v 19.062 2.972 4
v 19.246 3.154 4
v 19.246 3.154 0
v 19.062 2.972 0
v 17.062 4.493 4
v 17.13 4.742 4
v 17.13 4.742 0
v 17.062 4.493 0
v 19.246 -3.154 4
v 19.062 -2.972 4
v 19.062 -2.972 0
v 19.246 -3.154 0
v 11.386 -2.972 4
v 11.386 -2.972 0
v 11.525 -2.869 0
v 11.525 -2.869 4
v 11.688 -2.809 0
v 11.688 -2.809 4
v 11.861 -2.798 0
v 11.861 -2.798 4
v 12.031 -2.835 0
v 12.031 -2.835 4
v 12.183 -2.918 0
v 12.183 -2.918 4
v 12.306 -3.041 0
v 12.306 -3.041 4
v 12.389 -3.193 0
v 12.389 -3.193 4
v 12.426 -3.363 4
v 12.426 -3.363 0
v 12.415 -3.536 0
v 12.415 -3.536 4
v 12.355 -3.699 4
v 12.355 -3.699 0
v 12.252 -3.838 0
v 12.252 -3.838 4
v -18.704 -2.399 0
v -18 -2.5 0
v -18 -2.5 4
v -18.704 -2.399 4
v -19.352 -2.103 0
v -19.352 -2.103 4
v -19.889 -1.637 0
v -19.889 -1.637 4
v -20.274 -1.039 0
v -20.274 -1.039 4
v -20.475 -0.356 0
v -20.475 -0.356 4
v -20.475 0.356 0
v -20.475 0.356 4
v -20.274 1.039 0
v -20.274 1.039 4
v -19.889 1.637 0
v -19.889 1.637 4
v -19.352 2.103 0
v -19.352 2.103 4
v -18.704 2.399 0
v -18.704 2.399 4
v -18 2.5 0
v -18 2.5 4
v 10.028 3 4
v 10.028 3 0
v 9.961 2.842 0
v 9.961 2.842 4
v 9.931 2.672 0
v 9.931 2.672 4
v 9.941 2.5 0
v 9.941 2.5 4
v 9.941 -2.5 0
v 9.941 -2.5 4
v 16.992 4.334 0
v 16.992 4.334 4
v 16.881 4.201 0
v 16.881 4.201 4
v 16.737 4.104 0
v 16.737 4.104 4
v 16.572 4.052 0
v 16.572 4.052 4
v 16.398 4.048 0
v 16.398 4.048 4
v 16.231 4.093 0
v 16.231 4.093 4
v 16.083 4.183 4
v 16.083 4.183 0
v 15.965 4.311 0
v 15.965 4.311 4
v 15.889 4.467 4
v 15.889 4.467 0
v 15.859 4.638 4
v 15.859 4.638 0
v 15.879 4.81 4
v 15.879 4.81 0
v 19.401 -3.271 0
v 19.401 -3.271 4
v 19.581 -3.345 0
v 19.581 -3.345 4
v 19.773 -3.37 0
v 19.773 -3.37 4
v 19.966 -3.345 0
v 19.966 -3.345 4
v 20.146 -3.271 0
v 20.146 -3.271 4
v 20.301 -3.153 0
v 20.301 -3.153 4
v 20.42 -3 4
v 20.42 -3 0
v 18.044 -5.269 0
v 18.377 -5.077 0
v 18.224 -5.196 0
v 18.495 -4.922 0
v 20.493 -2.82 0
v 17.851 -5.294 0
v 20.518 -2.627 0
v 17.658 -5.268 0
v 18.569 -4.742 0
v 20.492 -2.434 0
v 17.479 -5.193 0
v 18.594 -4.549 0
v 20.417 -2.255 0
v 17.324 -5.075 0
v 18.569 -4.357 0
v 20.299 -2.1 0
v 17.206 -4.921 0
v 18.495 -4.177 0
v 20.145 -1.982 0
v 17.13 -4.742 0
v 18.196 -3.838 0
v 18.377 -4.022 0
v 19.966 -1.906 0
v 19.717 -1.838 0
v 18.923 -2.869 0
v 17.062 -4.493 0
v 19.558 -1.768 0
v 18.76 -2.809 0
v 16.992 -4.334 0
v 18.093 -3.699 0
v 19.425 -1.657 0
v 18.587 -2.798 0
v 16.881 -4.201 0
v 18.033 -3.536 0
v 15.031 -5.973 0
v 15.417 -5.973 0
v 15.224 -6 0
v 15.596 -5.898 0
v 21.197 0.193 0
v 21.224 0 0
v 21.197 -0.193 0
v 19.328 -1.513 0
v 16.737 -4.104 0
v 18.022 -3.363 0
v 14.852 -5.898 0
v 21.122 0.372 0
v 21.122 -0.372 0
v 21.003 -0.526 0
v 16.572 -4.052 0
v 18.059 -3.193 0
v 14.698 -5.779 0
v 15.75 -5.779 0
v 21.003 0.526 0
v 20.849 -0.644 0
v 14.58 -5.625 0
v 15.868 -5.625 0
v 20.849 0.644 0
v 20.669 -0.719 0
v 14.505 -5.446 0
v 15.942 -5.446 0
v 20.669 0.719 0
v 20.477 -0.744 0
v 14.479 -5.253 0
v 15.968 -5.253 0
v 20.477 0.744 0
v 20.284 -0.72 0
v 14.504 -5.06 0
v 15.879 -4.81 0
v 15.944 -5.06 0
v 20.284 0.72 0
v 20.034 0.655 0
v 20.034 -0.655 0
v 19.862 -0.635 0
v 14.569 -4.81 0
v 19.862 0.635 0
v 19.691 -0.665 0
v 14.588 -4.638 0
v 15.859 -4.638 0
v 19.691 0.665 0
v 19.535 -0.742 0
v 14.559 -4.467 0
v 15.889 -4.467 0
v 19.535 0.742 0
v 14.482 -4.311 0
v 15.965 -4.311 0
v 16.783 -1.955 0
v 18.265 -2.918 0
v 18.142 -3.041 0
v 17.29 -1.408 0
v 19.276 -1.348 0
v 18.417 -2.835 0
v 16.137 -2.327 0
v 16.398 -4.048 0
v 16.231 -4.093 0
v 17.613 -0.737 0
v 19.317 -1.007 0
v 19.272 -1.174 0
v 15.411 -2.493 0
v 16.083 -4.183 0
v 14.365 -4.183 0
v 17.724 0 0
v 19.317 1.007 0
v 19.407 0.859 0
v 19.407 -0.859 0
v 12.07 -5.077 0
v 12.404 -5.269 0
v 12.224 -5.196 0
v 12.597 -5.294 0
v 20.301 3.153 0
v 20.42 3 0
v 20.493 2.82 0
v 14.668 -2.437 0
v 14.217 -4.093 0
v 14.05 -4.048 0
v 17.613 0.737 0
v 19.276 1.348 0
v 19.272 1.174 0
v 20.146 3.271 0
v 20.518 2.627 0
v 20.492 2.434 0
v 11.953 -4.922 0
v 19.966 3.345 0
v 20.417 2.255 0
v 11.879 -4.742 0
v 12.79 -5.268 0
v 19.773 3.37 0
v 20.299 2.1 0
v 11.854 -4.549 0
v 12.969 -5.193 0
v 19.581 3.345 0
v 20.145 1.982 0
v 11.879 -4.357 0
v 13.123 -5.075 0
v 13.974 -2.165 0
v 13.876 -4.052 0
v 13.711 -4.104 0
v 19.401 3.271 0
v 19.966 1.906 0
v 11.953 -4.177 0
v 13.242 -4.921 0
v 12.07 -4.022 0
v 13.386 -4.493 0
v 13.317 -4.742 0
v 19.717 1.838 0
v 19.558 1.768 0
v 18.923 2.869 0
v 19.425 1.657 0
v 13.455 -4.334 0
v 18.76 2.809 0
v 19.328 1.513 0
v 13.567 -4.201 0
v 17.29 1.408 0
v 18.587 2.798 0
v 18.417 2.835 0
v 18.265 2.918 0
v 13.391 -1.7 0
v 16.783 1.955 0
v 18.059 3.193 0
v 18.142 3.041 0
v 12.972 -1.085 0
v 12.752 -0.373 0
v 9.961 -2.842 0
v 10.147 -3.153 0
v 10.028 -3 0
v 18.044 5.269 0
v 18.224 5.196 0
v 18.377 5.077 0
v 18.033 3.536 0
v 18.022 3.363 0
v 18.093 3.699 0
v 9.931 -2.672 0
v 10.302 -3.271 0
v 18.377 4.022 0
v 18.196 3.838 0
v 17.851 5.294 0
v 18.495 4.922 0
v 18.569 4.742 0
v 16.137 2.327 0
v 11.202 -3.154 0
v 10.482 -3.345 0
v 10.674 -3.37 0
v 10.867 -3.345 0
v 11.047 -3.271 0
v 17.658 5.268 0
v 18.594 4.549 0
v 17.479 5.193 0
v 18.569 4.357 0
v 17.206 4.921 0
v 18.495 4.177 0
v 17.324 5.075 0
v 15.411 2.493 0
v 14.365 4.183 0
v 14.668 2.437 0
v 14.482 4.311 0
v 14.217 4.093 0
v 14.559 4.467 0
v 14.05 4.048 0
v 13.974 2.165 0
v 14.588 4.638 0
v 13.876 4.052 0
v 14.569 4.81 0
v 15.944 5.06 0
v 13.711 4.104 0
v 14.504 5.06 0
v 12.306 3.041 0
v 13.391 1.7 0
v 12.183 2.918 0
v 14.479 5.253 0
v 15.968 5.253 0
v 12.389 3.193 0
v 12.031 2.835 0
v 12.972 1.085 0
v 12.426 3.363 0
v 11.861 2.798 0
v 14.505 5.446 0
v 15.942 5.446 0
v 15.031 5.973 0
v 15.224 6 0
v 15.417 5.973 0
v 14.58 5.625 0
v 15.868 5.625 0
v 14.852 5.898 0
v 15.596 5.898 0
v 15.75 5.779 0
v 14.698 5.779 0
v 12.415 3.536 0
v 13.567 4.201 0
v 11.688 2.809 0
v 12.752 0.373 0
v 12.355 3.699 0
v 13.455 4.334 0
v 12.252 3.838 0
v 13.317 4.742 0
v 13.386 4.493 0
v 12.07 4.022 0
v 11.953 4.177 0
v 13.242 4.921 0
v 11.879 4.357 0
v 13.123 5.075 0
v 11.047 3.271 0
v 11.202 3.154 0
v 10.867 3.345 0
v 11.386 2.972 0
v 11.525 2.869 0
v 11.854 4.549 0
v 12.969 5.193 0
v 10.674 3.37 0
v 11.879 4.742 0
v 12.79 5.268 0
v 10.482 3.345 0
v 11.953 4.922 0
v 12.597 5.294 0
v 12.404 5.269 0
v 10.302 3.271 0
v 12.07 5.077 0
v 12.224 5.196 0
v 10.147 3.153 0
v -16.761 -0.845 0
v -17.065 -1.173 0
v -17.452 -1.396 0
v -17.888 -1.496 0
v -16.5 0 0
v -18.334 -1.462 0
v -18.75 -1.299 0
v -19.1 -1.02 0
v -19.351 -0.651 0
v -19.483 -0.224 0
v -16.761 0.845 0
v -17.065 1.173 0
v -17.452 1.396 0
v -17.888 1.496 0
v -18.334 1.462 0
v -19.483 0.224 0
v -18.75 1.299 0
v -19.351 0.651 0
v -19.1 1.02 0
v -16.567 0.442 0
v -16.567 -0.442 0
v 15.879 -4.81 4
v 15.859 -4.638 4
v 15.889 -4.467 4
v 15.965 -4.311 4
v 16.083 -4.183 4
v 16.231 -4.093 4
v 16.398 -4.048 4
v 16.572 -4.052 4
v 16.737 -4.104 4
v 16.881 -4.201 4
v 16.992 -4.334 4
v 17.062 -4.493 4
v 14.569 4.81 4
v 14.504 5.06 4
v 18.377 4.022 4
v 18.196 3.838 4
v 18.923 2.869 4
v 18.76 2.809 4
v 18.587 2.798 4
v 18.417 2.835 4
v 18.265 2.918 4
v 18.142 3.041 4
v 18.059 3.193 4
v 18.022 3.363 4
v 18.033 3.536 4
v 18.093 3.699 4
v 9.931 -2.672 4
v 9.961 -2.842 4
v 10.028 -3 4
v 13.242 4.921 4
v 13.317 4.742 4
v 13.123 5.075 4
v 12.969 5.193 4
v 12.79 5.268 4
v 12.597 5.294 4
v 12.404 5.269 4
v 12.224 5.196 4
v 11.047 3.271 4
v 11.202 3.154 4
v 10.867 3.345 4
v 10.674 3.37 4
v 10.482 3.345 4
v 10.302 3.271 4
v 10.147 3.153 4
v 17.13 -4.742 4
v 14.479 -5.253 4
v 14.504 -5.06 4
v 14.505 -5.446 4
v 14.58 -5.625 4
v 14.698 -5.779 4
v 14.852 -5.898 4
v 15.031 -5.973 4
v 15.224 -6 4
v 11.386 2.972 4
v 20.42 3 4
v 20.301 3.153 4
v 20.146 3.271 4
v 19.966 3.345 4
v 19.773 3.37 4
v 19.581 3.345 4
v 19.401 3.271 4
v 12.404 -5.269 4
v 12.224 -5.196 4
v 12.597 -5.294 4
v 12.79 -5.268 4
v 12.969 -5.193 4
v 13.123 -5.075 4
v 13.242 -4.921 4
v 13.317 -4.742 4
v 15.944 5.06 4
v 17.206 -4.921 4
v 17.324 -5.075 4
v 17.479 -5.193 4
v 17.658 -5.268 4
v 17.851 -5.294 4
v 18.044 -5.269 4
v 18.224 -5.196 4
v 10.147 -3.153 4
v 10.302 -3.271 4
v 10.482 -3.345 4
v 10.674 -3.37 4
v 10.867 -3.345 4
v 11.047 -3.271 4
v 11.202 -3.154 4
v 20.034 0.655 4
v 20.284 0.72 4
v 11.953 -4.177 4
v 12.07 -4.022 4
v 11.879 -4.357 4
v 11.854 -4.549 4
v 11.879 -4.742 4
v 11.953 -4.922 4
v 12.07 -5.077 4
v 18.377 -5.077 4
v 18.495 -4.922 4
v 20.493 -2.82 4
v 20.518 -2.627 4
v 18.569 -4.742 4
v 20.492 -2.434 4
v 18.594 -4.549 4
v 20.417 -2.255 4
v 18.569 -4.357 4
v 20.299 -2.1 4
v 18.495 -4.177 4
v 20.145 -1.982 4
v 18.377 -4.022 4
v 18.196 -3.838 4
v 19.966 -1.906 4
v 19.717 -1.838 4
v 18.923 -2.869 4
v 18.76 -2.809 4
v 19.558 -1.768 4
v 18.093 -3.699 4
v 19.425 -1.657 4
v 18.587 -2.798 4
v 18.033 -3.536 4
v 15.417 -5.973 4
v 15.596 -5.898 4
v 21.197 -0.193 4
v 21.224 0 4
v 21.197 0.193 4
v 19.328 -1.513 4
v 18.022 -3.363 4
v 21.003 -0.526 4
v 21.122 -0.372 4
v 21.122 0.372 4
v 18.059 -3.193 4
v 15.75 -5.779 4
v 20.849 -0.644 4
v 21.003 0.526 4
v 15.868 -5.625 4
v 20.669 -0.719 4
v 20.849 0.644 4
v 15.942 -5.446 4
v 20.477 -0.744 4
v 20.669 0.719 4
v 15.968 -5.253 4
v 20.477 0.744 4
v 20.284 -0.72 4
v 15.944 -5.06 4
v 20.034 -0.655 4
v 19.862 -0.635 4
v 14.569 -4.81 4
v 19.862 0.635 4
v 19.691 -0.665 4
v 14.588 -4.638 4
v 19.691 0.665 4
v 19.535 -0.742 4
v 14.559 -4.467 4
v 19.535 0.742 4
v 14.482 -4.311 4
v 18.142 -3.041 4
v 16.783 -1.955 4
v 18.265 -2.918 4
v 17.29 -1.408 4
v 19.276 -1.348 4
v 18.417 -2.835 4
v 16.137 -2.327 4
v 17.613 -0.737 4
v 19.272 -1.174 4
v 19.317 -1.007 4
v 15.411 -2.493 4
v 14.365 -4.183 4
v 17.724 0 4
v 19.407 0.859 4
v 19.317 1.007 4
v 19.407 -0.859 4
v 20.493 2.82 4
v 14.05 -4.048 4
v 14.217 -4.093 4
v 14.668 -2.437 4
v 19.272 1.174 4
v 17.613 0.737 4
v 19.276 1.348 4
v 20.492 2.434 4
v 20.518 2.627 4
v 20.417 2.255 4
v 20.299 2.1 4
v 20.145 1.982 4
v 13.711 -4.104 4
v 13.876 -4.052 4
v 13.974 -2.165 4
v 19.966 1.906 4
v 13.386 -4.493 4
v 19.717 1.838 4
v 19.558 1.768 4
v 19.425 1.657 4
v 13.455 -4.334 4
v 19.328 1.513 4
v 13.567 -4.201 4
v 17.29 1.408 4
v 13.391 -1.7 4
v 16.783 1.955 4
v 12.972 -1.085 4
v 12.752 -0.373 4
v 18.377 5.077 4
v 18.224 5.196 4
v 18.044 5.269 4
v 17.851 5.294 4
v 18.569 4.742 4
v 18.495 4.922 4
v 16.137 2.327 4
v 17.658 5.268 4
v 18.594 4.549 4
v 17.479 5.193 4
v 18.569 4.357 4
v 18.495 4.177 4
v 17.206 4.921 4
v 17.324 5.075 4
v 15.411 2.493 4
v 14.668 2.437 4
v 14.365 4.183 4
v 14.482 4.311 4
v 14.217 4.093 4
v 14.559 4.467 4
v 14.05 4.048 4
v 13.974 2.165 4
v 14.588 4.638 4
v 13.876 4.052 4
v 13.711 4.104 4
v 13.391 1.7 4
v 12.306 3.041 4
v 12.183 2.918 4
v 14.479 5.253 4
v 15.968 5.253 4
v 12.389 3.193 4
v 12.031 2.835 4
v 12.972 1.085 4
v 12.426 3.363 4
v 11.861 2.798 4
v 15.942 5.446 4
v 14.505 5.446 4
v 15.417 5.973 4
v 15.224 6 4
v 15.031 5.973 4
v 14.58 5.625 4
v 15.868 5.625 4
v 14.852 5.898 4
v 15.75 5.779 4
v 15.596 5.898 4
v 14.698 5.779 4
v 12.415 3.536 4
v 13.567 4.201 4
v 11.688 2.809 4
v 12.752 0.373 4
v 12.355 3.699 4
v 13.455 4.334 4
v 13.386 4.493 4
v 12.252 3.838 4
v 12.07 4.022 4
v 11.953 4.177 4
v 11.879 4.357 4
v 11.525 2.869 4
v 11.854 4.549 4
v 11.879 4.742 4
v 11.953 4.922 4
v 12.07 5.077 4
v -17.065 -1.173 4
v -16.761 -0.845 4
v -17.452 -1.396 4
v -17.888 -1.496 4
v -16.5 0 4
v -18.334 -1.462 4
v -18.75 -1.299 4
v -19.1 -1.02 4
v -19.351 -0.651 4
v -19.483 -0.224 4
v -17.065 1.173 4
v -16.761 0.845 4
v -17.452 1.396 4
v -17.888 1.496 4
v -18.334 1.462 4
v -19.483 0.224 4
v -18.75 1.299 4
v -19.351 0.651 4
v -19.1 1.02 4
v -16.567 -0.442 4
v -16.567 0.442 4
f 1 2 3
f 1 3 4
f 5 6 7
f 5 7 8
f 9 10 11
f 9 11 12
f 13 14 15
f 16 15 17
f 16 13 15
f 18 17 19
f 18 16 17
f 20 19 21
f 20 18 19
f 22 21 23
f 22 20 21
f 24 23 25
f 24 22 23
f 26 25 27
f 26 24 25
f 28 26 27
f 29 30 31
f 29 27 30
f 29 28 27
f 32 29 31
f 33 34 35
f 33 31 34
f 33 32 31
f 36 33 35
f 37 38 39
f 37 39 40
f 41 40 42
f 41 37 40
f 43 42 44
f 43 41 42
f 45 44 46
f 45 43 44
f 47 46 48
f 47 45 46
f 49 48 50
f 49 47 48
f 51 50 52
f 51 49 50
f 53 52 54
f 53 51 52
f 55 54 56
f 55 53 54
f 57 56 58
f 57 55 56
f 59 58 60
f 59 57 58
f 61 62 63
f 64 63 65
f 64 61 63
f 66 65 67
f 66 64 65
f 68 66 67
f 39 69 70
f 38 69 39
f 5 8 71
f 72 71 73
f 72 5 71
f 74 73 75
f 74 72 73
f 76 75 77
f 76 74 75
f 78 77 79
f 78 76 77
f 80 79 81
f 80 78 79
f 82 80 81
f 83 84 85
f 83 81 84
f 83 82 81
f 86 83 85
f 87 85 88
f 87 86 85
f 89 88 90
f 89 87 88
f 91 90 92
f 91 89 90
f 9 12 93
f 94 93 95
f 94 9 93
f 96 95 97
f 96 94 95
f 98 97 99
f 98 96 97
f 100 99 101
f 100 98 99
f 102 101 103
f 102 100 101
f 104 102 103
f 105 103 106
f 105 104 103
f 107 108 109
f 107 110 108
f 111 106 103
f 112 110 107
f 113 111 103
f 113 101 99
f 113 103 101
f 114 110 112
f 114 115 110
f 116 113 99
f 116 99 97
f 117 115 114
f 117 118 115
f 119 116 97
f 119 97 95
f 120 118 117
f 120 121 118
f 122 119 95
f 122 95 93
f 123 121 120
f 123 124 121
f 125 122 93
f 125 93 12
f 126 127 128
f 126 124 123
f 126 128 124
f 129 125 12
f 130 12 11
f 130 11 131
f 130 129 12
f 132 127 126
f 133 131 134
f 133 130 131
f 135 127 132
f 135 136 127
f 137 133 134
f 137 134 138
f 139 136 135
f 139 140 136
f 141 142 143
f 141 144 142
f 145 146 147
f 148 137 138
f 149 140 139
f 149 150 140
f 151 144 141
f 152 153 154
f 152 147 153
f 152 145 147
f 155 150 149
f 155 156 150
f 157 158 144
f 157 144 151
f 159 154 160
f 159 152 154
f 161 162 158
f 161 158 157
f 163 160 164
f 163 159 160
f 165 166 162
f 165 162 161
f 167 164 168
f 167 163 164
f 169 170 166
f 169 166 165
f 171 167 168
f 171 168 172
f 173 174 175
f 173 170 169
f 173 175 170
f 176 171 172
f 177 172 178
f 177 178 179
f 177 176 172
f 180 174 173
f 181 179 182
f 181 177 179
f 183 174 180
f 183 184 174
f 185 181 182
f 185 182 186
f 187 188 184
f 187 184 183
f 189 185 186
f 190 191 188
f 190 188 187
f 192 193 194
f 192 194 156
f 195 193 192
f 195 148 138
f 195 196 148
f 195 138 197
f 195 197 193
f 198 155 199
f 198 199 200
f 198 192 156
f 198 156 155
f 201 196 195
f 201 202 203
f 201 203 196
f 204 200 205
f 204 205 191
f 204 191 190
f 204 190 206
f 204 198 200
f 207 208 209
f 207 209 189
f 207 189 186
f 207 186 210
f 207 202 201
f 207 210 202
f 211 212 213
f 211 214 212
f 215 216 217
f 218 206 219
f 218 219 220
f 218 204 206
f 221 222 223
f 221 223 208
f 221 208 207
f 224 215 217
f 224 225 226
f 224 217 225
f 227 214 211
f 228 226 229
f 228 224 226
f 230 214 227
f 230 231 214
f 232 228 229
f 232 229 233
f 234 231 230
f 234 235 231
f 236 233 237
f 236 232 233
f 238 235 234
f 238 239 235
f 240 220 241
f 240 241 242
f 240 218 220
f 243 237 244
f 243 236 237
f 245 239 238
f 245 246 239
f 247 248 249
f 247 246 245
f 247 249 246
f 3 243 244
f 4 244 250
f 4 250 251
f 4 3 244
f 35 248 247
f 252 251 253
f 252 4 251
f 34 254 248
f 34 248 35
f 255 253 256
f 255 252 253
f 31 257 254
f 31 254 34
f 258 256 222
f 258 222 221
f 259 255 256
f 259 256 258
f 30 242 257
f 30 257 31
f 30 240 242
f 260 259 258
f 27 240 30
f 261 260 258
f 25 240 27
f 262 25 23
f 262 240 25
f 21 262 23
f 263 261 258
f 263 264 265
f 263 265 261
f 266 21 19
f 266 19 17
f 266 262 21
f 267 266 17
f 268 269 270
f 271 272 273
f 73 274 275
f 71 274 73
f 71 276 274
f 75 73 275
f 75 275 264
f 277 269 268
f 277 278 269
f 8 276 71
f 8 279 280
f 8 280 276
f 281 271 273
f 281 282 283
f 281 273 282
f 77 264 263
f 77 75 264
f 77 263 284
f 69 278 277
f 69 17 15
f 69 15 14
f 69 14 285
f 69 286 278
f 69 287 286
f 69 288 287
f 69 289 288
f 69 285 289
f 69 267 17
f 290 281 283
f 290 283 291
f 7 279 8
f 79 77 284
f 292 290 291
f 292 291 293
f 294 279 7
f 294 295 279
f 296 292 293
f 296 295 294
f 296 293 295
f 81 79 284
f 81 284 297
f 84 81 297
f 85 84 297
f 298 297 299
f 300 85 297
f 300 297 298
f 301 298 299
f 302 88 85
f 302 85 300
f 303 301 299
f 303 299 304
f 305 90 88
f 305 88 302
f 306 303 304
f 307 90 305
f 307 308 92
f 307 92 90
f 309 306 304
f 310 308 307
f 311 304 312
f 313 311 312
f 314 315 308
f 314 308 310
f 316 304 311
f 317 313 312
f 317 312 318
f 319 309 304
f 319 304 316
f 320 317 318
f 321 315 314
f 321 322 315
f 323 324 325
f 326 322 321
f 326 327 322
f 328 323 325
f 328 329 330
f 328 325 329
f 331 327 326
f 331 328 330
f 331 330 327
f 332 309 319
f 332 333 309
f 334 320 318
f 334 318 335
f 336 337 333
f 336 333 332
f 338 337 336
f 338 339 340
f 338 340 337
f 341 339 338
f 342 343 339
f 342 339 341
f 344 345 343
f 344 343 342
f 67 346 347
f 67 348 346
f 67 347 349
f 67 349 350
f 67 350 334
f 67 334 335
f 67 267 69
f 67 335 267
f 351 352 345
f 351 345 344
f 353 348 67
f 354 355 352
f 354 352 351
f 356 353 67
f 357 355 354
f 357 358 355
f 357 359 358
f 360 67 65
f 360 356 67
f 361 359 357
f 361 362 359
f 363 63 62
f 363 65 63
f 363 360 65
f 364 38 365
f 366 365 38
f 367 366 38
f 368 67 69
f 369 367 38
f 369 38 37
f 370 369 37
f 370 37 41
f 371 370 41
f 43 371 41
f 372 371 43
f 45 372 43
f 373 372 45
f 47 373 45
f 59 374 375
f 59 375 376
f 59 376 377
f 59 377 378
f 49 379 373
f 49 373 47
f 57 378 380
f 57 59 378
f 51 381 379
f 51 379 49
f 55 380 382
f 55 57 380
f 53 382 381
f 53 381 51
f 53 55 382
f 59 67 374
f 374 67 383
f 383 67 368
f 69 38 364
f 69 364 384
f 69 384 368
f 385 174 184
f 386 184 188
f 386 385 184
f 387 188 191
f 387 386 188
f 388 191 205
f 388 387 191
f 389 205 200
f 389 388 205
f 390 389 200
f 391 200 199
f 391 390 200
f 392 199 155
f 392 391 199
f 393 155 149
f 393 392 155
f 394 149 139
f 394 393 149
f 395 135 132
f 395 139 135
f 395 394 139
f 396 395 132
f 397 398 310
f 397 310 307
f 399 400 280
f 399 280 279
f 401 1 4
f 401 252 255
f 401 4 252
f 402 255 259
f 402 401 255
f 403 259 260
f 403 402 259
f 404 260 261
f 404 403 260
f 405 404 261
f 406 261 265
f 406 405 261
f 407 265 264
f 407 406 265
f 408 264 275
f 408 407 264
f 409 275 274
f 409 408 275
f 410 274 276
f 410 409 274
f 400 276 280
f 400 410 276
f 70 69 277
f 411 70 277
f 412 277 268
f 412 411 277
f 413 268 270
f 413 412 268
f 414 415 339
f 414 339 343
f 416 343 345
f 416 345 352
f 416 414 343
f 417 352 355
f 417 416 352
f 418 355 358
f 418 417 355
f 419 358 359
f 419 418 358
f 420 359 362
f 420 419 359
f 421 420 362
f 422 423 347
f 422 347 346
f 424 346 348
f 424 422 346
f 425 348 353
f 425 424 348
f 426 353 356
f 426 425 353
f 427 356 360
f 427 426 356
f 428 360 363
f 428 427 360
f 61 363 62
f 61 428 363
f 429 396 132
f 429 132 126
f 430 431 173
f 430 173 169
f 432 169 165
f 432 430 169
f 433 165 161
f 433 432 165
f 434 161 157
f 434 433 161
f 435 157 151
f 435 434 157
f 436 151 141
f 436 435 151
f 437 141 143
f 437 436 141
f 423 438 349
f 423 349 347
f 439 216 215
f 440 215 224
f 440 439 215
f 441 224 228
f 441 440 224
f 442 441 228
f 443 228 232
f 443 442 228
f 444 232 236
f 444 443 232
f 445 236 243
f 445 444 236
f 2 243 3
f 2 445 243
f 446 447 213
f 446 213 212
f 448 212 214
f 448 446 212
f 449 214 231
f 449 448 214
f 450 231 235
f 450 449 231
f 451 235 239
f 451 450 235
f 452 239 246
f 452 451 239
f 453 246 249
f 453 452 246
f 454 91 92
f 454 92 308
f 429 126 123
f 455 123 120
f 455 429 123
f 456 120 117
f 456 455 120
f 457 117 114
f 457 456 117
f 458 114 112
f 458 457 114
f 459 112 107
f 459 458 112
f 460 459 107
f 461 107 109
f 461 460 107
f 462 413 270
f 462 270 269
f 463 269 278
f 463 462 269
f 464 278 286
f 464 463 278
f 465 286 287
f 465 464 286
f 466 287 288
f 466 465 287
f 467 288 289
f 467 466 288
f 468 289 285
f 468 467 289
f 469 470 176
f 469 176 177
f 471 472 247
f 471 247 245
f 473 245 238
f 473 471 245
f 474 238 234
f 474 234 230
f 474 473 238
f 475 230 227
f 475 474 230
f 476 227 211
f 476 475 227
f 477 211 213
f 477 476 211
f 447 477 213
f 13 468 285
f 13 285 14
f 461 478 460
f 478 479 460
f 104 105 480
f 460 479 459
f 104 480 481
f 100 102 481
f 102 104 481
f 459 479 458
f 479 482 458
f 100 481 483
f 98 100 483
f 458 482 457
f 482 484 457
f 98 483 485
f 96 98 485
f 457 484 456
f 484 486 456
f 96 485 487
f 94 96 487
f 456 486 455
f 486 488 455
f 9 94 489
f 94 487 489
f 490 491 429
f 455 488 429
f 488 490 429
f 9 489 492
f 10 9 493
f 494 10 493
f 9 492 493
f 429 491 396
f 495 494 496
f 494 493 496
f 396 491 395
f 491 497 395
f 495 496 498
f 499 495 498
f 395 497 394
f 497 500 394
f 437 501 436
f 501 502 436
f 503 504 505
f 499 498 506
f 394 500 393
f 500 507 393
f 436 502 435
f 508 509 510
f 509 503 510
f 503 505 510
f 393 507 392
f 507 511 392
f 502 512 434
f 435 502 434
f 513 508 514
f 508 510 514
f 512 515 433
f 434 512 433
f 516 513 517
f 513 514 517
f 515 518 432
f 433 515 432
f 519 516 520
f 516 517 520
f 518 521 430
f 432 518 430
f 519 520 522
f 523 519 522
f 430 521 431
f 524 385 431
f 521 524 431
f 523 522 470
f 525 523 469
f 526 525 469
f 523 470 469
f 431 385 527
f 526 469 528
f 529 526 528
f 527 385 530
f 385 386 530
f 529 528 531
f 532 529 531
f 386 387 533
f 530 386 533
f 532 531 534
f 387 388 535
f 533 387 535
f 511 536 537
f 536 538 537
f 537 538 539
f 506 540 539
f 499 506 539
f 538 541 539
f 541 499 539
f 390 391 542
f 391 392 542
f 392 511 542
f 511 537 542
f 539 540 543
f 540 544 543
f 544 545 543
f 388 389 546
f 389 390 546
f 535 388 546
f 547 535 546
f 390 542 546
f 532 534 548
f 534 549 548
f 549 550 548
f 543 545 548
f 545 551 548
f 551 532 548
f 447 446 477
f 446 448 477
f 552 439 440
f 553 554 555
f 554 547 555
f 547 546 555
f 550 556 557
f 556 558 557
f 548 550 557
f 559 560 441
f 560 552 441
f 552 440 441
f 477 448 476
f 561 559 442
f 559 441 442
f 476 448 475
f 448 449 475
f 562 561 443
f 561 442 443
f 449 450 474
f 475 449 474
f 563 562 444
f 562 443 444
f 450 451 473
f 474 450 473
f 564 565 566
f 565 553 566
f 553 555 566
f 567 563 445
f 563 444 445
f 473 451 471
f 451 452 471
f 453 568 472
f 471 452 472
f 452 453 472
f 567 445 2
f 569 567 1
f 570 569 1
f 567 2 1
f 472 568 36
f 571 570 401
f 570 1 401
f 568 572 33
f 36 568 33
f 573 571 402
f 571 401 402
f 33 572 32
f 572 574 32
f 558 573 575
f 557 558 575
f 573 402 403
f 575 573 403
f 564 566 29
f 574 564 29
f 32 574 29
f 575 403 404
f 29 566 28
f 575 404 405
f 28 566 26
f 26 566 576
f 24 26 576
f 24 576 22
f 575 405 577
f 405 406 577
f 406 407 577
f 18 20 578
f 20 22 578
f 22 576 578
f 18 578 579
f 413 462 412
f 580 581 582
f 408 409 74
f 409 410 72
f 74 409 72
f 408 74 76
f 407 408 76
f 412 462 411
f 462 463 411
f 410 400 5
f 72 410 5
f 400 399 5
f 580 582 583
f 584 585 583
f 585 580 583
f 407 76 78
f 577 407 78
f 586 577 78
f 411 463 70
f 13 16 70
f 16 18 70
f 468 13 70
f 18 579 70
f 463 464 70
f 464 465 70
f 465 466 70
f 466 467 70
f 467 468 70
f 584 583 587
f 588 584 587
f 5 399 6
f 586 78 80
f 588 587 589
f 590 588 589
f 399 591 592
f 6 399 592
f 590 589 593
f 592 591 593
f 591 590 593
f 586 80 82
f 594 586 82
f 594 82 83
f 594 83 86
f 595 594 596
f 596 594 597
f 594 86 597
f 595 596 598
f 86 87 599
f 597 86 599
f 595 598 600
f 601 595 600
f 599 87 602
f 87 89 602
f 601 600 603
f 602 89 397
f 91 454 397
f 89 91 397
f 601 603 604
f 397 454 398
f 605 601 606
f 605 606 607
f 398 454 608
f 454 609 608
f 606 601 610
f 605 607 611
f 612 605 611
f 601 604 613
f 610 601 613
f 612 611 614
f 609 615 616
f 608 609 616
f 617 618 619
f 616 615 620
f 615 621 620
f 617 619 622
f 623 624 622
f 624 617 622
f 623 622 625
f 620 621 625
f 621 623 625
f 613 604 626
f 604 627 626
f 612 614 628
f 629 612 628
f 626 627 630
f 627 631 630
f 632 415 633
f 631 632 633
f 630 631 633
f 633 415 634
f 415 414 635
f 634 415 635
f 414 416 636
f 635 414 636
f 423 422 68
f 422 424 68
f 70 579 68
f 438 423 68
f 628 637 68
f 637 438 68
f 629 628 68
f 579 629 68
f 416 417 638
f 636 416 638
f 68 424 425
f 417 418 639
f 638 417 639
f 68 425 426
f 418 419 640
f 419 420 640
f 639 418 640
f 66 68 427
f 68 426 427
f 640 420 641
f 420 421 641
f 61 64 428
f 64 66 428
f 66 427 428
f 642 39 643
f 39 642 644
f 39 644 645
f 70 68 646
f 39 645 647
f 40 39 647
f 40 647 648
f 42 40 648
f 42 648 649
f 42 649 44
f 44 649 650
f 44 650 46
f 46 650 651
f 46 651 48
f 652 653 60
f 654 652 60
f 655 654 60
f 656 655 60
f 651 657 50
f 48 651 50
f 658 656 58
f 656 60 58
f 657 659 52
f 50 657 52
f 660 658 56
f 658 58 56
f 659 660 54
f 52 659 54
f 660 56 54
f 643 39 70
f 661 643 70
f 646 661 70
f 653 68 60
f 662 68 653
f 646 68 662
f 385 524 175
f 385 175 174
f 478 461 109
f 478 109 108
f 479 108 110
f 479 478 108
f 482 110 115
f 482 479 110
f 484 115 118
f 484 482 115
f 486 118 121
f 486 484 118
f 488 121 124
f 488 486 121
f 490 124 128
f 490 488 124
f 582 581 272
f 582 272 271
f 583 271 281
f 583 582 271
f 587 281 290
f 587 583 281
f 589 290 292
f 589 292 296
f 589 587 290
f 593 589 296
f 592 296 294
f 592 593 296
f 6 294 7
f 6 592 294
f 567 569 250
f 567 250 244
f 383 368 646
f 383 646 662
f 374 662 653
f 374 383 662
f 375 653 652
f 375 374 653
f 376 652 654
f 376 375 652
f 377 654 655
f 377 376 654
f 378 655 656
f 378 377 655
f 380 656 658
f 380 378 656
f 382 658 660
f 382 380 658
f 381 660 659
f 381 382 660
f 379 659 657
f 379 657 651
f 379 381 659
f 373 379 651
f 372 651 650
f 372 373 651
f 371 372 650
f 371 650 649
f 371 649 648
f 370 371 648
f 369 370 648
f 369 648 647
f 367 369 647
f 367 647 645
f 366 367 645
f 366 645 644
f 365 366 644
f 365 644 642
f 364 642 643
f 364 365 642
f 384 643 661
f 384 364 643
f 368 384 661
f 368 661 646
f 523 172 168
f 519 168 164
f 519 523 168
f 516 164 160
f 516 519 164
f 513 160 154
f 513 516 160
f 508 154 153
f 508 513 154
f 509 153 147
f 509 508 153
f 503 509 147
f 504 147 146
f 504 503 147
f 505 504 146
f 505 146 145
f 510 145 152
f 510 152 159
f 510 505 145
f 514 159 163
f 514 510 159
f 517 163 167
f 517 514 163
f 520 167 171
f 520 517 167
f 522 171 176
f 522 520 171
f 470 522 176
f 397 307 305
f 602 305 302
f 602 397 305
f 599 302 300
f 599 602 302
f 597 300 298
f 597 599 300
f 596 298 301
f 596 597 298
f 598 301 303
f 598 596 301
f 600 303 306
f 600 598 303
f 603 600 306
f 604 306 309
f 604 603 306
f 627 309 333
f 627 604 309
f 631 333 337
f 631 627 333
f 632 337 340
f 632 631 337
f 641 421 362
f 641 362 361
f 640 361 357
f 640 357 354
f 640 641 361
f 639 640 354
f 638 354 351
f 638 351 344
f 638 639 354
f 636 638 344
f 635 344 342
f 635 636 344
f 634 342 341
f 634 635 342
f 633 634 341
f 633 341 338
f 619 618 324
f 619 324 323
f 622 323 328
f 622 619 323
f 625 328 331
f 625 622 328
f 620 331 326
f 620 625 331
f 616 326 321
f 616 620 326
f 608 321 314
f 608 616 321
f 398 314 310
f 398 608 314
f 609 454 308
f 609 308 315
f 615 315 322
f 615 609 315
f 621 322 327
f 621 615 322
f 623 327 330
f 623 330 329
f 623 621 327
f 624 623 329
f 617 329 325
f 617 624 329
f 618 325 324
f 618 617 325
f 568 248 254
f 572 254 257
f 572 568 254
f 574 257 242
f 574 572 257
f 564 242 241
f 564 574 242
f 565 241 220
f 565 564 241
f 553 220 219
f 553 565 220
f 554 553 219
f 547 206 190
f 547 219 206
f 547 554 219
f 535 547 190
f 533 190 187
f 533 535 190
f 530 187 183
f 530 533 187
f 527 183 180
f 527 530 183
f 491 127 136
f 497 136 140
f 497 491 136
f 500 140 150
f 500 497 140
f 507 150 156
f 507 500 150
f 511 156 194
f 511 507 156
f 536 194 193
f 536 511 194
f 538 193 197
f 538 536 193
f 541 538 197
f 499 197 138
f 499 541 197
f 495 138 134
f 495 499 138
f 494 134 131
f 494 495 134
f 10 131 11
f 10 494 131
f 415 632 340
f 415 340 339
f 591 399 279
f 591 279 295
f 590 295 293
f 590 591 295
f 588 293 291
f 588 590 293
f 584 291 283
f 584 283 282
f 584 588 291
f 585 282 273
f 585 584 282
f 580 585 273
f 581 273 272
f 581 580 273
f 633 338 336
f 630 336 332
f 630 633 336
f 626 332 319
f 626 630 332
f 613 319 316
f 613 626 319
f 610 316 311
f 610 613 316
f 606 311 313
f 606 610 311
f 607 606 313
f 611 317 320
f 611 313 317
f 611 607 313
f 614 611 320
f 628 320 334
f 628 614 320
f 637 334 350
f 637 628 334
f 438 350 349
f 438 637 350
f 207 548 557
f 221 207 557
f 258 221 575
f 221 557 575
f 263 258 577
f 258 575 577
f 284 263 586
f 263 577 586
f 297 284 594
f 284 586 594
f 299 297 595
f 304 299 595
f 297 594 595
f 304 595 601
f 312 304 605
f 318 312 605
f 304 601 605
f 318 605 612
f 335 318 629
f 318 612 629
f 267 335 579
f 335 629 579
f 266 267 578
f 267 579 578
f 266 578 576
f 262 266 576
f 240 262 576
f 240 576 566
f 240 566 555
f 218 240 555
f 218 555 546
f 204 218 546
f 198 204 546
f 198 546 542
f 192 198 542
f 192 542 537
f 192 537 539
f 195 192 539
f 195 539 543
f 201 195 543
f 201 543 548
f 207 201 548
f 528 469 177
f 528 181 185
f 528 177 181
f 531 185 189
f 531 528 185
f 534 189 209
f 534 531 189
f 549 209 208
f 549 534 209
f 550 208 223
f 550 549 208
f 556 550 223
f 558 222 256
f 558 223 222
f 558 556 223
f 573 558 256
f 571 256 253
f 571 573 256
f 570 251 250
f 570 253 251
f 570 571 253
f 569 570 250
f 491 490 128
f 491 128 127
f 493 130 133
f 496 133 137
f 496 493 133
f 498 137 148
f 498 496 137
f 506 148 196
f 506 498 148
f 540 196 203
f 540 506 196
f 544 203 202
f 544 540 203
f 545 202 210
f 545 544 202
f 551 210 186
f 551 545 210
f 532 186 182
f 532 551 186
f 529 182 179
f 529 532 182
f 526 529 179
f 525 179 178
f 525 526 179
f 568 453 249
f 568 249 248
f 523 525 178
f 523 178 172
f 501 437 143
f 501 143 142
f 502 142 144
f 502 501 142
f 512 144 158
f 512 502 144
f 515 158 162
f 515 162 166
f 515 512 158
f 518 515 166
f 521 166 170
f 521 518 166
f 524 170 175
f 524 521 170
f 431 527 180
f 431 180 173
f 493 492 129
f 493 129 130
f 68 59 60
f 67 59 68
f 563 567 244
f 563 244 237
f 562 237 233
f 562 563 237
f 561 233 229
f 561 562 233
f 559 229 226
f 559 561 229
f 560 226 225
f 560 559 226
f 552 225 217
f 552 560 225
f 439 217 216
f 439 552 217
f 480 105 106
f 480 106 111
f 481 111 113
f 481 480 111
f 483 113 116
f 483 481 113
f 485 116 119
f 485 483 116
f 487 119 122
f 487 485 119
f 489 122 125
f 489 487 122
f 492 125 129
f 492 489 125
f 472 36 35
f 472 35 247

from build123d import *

# Parameters (mm, degrees)
SKETCH1_R           = 1.5
BOSS_EXTRUDE1_DEPTH = 4
CUT_EXTRUDE1_DEPTH  = 23.415528994
CIRPATTERN1_COUNT   = 12
SKETCH3_W           = 11.336678395
SKETCH3_H           = 5
BOSS_EXTRUDE2_DEPTH = 4
SKETCH4_R           = 2.5
CUT_EXTRUDE2_DEPTH  = 23.415528994


with BuildPart() as part:
    # Sketch1 → Boss-Extrude1 (new body)
    with BuildSketch(Plane.XY):
        with BuildLine():
            Line((-18, 2.5), (9.769591268, 2.5))
            ThreePointArc((9.769591268, 2.5), (21.223947325, 0), (9.769591268, -2.5))
            Line((9.769591268, -2.5), (-18, -2.5))
            ThreePointArc((-18, -2.5), (-20.5, 0), (-18, 2.5))
        make_face()
        with Locations((-18, 0)):
            Circle(SKETCH1_R, mode=Mode.SUBTRACT)
    extrude(amount=BOSS_EXTRUDE1_DEPTH)

    # Sketch2 → Cut-Extrude1 (cut, through all)
    with BuildSketch(Plane.XY.offset(4)):
        with BuildLine():
            Line((15.878876805, 4.81), (15.943947325, 5.06))
            ThreePointArc((15.943947325, 5.06), (15.813826986, 5.706078038), (15.223947325, 6))
            ThreePointArc((15.223947325, 6), (16.816567466, 5.943739283), (18.223947325, 5.196152423))
            ThreePointArc((18.223947325, 5.196152423), (17.566135573, 5.236548367), (17.130409034, 4.742088543))
            Line((17.130409034, 4.742088543), (17.061761758, 4.493046932))
            ThreePointArc((17.061761758, 4.493046932), (16.312974518, 4.064304815), (15.878876805, 4.81))
        make_face()
    cut_extrude1 = extrude(amount=-CUT_EXTRUDE1_DEPTH, mode=Mode.SUBTRACT)

    # CirPattern1: Cut-Extrude1 ×12 about axis
    cirpattern1_axis = Axis((15.223947325, 0, 0), (0, 0, 1))
    for i in range(1, CIRPATTERN1_COUNT):
        add(cut_extrude1.rotate(cirpattern1_axis, i * 360 / CIRPATTERN1_COUNT), mode=Mode.SUBTRACT)

    # Sketch3 → Boss-Extrude2 (add)
    with BuildSketch(Plane.XY.offset(4)):
        with Locations((11.656973093, 0)):
            Rectangle(SKETCH3_W, SKETCH3_H)
    extrude(amount=-BOSS_EXTRUDE2_DEPTH)

    # Sketch4 → Cut-Extrude2 (cut, through all)
    with BuildSketch(Plane.XY.offset(4)):
        with Locations((15.223947325, 0)):
            Circle(SKETCH4_R)
    extrude(amount=-CUT_EXTRUDE2_DEPTH, mode=Mode.SUBTRACT)


solid = part.part
